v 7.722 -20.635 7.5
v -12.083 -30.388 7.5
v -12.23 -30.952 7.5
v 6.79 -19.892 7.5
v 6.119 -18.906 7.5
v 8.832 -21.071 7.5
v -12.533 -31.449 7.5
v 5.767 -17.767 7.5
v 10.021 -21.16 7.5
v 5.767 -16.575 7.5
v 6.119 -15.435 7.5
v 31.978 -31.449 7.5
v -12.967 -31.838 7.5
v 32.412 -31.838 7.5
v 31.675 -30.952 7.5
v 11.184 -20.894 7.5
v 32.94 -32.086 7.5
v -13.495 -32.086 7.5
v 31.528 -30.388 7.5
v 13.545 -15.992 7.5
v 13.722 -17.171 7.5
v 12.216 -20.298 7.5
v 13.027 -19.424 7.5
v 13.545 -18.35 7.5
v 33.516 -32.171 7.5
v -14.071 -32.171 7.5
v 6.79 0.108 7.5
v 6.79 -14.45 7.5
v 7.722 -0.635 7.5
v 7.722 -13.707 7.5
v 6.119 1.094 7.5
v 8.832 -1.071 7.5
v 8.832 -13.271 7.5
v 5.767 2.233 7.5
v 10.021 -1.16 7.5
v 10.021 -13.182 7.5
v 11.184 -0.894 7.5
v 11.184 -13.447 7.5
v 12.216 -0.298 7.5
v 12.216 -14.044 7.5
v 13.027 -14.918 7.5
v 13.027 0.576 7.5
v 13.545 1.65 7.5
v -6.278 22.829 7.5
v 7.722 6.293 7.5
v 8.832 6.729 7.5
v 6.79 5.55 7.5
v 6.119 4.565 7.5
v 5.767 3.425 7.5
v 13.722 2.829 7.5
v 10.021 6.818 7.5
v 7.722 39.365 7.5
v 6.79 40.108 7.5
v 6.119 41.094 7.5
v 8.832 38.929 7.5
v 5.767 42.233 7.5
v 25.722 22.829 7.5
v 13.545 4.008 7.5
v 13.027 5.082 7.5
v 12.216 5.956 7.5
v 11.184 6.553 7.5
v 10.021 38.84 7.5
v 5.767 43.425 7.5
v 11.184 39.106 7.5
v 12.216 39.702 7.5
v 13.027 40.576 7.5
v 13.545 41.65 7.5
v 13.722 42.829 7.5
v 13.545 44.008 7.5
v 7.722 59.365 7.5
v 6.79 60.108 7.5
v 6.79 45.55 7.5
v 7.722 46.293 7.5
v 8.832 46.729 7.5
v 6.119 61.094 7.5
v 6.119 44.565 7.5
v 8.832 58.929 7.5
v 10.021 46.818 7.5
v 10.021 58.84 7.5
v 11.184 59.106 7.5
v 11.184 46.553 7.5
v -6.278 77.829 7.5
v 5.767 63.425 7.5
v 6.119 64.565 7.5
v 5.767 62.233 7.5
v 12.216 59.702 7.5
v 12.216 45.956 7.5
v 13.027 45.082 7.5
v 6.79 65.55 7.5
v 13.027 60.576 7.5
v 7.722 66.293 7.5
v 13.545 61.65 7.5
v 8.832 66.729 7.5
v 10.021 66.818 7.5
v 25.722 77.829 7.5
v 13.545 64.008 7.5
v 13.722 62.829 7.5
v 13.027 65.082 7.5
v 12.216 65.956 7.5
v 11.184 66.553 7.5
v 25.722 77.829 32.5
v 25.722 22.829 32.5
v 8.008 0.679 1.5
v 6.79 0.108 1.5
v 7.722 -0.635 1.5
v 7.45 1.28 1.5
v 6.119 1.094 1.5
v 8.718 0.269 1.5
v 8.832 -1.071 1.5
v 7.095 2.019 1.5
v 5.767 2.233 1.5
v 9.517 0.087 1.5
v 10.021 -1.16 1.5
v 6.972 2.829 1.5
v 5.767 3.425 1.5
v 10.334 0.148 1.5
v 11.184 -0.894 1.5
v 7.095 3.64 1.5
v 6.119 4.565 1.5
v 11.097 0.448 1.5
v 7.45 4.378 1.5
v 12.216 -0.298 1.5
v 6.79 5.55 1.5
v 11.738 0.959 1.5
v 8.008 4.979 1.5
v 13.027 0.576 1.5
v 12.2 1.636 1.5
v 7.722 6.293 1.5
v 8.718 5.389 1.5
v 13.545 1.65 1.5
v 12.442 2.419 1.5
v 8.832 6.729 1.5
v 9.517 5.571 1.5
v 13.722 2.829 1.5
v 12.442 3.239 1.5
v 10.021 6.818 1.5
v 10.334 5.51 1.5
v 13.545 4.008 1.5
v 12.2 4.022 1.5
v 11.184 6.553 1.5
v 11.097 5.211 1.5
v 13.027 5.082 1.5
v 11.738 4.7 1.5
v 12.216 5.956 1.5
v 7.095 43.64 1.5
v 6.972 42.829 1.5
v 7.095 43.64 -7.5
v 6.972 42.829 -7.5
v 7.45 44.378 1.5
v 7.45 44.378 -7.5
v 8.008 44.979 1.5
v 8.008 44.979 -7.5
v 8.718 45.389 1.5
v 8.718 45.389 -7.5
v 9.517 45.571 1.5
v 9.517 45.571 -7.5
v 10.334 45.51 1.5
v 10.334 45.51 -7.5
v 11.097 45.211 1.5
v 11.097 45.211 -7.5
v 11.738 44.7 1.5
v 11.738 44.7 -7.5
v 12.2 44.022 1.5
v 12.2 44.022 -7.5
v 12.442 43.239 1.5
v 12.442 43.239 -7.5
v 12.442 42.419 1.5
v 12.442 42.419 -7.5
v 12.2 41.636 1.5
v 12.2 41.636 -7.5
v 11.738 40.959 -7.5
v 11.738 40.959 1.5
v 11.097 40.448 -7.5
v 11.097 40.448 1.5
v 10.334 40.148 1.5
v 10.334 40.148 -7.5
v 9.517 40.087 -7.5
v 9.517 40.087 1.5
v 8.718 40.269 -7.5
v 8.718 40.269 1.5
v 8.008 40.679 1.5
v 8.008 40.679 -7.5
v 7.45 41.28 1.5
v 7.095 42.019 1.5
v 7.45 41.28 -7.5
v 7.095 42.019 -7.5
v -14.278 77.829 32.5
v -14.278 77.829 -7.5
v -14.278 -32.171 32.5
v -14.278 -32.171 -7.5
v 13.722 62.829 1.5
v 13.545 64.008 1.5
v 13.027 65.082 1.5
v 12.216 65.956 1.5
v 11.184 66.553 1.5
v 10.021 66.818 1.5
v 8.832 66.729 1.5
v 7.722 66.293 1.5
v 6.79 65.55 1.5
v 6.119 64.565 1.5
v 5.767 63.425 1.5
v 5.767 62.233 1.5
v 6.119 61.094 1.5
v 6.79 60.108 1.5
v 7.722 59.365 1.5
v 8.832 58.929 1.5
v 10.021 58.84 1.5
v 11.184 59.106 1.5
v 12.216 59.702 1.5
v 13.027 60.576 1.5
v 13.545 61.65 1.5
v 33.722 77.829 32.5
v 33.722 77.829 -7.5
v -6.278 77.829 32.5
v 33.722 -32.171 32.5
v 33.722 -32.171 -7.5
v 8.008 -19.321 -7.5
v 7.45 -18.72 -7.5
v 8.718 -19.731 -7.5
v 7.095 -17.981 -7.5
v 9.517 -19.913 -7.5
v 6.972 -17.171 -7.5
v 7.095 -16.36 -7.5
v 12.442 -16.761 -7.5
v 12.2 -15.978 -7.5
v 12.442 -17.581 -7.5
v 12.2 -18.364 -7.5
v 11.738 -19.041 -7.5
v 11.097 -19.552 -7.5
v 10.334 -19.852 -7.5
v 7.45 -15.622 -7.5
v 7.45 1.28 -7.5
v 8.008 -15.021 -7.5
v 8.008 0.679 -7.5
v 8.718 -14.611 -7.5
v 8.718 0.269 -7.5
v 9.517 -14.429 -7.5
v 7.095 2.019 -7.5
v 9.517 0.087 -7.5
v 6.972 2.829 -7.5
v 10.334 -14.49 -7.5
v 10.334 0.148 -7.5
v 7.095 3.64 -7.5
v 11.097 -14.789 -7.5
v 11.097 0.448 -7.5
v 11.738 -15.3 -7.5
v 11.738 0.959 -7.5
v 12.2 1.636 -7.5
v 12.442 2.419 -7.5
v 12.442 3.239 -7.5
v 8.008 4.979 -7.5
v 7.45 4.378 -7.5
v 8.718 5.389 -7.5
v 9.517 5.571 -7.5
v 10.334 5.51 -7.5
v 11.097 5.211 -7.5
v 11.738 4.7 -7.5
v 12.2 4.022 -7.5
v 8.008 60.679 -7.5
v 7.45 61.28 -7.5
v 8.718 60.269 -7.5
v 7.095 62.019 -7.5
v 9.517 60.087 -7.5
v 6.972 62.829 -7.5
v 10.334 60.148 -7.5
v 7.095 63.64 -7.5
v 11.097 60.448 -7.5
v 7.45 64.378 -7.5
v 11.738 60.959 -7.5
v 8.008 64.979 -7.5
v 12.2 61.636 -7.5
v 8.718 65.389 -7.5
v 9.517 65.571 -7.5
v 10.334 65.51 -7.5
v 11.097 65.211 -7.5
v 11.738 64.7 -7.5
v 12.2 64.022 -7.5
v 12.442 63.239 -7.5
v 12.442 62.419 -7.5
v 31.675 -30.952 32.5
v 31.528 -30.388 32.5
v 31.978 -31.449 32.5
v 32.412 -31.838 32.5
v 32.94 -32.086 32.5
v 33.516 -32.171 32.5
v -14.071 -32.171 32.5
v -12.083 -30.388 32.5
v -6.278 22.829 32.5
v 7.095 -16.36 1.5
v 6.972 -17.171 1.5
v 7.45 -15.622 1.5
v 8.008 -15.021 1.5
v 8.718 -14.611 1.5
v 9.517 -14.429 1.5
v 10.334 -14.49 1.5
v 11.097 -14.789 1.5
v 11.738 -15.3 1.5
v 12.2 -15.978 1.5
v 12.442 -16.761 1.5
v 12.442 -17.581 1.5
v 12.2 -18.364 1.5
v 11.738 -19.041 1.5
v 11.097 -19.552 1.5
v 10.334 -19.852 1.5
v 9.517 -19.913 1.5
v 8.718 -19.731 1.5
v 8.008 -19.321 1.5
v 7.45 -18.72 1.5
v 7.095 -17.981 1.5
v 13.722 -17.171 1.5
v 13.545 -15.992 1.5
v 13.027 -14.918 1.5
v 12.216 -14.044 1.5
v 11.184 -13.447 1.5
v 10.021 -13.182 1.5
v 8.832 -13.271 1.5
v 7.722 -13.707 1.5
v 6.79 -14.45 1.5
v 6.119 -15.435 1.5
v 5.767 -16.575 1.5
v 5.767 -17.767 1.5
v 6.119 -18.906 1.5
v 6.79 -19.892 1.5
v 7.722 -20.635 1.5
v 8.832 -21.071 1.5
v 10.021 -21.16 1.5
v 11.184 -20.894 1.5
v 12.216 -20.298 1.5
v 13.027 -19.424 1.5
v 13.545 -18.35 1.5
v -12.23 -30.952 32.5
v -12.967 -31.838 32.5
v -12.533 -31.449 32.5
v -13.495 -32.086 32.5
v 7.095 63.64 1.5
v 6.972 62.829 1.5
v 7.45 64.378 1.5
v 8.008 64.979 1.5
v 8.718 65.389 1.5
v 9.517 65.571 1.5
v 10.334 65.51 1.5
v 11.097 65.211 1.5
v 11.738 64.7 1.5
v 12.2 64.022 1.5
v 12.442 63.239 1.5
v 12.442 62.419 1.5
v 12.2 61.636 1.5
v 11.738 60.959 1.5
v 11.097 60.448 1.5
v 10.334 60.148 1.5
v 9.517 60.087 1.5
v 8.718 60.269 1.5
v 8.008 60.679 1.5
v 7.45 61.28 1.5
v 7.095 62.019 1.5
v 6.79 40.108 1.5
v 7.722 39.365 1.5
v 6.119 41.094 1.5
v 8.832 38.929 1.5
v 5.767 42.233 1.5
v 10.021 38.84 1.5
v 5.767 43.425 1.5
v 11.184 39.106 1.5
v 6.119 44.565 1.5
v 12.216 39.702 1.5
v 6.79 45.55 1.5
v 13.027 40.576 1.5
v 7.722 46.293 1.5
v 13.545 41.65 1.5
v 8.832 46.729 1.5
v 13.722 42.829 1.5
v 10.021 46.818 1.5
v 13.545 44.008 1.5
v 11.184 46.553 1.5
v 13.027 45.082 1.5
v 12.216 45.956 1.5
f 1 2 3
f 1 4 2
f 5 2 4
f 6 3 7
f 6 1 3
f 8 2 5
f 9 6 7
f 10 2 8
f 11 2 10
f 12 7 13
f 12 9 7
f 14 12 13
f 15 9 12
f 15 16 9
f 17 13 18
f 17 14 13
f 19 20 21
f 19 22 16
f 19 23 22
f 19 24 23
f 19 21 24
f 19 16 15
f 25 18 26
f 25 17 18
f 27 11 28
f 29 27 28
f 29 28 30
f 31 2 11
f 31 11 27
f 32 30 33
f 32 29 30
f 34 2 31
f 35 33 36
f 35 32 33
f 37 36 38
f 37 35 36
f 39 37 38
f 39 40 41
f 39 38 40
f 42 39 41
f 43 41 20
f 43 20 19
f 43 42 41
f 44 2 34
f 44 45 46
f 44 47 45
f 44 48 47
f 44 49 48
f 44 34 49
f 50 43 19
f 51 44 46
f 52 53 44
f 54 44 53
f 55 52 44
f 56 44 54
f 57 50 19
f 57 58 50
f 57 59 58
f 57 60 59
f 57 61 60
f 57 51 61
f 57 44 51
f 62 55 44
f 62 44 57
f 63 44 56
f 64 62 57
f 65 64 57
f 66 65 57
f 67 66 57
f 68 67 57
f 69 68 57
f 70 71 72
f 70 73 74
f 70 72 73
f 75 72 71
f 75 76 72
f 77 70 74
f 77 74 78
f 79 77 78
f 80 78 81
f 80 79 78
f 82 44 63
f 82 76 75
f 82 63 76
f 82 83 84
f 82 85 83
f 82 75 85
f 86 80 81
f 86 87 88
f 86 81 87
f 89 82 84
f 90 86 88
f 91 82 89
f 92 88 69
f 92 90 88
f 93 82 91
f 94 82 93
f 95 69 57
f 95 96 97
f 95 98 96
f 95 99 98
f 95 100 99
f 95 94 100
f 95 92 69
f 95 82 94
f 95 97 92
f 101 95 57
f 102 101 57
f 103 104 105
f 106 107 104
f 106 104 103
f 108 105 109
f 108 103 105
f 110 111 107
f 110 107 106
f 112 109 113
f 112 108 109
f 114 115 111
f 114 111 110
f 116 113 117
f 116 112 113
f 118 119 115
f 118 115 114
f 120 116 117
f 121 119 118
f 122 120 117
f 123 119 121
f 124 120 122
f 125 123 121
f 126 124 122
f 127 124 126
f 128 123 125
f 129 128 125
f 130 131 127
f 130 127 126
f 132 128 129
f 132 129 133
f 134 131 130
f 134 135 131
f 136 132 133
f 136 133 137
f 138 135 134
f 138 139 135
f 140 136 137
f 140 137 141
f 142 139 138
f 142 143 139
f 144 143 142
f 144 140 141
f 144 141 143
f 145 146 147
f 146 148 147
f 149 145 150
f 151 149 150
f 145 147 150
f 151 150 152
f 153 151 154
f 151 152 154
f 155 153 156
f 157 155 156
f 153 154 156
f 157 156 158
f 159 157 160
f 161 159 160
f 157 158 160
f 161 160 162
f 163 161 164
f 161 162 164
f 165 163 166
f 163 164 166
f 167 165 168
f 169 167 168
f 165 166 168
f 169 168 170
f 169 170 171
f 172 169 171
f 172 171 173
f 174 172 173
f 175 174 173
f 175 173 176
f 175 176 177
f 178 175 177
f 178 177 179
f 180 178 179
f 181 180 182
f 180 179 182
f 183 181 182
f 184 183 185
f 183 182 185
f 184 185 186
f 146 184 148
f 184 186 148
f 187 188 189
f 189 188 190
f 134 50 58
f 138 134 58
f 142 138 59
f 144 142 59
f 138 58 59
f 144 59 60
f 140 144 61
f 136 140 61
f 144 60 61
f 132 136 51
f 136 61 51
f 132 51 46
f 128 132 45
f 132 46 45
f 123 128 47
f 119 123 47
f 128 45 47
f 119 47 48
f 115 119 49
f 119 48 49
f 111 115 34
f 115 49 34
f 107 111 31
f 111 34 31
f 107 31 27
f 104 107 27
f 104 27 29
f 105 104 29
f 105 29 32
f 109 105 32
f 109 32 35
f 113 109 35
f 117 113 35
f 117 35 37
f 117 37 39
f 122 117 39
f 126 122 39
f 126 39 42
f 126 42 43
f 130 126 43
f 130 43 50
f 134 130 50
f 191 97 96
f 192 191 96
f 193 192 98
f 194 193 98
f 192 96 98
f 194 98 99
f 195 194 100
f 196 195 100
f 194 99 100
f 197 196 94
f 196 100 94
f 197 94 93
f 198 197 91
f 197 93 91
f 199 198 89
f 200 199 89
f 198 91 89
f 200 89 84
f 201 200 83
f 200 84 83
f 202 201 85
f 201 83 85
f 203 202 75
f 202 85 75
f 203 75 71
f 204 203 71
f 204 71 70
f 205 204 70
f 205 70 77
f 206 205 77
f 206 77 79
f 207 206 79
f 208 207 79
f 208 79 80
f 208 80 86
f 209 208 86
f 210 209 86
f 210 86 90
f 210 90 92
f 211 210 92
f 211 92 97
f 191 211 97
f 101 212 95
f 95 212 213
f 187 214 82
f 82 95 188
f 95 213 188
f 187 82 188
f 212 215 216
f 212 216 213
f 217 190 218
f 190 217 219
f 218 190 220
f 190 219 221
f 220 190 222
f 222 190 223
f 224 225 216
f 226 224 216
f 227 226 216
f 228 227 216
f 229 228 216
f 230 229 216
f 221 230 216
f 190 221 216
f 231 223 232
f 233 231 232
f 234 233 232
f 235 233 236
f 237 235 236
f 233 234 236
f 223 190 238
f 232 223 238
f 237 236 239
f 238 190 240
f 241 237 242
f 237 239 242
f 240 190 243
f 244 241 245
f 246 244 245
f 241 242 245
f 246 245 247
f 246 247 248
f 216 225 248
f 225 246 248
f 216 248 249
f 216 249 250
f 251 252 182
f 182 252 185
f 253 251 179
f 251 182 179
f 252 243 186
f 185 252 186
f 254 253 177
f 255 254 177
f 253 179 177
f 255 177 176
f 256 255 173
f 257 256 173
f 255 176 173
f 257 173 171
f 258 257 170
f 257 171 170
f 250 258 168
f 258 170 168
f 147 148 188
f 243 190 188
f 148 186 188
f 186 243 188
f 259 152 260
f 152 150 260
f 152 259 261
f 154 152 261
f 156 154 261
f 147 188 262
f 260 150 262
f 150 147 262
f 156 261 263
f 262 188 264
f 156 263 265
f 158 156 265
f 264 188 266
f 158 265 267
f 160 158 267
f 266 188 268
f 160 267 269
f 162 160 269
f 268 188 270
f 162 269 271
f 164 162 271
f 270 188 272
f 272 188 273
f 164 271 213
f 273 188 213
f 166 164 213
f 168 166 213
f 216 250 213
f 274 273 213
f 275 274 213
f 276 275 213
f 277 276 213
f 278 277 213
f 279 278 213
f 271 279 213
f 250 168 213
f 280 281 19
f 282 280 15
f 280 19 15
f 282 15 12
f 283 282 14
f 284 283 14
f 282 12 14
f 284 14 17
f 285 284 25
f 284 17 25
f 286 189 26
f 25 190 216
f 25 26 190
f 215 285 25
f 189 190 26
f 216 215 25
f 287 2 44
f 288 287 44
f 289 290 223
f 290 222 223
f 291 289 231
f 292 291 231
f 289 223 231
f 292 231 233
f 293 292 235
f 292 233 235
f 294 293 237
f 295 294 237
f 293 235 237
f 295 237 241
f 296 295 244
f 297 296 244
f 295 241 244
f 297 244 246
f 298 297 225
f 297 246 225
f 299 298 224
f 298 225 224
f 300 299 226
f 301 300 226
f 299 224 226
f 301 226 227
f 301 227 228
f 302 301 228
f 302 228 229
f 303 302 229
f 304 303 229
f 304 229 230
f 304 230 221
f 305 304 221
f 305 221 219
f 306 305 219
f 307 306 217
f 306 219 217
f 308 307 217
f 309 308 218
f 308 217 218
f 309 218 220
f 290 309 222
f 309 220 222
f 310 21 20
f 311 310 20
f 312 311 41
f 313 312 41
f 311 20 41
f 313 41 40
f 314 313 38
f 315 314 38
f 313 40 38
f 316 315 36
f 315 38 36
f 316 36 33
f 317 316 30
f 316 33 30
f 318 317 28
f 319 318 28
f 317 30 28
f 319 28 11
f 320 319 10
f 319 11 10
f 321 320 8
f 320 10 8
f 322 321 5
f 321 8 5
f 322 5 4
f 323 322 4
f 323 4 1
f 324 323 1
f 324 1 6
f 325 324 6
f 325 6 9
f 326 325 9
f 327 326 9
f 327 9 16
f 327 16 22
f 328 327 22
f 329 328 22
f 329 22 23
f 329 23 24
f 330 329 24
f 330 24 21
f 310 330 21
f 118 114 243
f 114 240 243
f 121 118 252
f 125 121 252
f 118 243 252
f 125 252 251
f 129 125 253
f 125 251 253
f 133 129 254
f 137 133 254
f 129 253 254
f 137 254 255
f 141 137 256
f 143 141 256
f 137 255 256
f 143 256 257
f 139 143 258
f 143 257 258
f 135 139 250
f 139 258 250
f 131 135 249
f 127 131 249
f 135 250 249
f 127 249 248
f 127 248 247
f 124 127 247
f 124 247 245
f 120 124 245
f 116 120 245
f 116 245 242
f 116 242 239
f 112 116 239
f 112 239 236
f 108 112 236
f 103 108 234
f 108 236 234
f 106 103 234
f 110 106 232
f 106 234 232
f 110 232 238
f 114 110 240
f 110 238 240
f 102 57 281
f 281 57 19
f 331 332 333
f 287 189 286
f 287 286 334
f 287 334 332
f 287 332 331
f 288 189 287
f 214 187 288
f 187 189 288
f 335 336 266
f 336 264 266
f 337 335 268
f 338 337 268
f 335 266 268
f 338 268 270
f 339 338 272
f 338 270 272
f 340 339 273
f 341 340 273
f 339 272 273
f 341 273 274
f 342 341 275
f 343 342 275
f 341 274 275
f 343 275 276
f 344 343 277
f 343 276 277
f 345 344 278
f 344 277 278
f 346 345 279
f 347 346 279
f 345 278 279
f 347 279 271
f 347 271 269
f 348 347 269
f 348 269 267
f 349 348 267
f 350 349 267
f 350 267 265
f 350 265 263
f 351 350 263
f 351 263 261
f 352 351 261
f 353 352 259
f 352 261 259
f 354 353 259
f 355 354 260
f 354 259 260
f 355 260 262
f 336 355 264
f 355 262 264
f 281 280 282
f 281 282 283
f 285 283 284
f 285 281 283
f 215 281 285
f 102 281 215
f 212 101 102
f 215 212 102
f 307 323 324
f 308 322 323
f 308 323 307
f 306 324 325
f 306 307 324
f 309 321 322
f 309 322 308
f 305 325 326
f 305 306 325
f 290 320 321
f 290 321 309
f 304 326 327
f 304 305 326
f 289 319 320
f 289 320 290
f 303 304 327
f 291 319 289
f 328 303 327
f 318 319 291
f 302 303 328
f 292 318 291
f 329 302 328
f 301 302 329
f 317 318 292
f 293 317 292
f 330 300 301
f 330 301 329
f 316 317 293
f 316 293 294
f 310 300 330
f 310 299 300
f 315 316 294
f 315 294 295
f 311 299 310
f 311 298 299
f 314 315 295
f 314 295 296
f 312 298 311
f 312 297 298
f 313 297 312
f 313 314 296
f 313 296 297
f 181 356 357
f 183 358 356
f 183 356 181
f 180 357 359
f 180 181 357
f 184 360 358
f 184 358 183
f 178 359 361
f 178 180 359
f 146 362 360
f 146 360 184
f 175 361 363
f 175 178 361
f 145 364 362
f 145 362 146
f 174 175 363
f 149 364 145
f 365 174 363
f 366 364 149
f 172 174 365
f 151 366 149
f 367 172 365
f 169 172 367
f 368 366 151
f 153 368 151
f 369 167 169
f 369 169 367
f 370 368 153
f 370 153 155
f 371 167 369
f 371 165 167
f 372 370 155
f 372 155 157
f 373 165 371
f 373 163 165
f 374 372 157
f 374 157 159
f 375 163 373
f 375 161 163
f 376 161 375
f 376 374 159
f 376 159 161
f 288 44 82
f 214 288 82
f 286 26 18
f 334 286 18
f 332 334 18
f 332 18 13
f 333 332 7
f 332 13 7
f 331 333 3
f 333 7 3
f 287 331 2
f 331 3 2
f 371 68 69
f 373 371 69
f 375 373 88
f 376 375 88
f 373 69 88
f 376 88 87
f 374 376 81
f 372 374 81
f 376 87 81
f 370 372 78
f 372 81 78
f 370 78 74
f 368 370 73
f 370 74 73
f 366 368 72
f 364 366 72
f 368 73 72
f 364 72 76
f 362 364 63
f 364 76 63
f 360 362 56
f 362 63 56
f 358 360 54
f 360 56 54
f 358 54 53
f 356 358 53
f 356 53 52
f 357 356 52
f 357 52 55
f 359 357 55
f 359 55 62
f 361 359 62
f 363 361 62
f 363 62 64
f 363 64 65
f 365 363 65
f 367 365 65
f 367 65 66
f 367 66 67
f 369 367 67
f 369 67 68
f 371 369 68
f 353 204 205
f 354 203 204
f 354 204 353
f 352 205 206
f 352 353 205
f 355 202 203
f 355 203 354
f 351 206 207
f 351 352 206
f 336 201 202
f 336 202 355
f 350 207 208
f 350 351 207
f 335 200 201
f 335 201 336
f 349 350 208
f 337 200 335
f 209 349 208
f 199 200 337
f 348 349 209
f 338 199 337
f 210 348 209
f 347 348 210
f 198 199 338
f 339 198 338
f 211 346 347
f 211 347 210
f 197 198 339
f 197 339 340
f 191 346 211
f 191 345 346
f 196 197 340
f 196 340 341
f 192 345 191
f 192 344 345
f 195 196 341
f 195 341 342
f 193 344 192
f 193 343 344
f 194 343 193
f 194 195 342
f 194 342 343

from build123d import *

# Parameters (mm, degrees)
F0_W           = 48
F0_H           = 110
F1_DEPTH       = 7.5
F4_DEPTH       = 25
F6_D           = 5.5
F6_CBORE_D     = 8
F6_CBORE_DEPTH = 6


with BuildPart() as f1:
    # F0 (on Top) → F1 (new body, symmetric)
    with BuildSketch(Plane.XY):
        with Locations((9.722433, 22.829119)):
            Rectangle(F0_W, F0_H)
    extrude(amount=F1_DEPTH, both=True)

    # F3 (on face) → F4 (join)
    with BuildSketch(Plane.XY.offset(7.5)):
        with BuildLine():
            Line((-6.277567, 22.829119), (-6.277567, 77.829119))
            Line((-6.277567, 77.829119), (-14.277567, 77.829119))
            Line((-14.277567, 77.829119), (-14.277567, -32.170881))
            Line((-14.277567, -32.170881), (-14.071251, -32.170881))
            ThreePointArc((-14.071251, -32.170881), (-12.735921, -31.659805), (-12.083047, -30.387776))
            Line((-12.083047, -30.387776), (-6.277567, 22.829119))
        make_face()
        with BuildLine():
            Line((33.722433, 77.829119), (25.722433, 77.829119))
            Line((25.722433, 77.829119), (25.722433, 22.829119))
            Line((25.722433, 22.829119), (31.527912, -30.387776))
            ThreePointArc((31.527912, -30.387776), (32.180787, -31.659805), (33.516117, -32.170881))
            Line((33.516117, -32.170881), (33.722433, -32.170881))
            Line((33.722433, -32.170881), (33.722433, 77.829119))
        make_face()
    extrude(amount=F4_DEPTH)

    # F6 (through all)
    with Locations(Plane.XY.offset(7.5)):
        with Locations((9.722433, 42.829119), (9.722433, 62.829119), (9.722433, 2.829119), (9.722433, -17.170881)):
            CounterBoreHole(F6_D / 2, F6_CBORE_D / 2, F6_CBORE_DEPTH)


solid = f1.part
